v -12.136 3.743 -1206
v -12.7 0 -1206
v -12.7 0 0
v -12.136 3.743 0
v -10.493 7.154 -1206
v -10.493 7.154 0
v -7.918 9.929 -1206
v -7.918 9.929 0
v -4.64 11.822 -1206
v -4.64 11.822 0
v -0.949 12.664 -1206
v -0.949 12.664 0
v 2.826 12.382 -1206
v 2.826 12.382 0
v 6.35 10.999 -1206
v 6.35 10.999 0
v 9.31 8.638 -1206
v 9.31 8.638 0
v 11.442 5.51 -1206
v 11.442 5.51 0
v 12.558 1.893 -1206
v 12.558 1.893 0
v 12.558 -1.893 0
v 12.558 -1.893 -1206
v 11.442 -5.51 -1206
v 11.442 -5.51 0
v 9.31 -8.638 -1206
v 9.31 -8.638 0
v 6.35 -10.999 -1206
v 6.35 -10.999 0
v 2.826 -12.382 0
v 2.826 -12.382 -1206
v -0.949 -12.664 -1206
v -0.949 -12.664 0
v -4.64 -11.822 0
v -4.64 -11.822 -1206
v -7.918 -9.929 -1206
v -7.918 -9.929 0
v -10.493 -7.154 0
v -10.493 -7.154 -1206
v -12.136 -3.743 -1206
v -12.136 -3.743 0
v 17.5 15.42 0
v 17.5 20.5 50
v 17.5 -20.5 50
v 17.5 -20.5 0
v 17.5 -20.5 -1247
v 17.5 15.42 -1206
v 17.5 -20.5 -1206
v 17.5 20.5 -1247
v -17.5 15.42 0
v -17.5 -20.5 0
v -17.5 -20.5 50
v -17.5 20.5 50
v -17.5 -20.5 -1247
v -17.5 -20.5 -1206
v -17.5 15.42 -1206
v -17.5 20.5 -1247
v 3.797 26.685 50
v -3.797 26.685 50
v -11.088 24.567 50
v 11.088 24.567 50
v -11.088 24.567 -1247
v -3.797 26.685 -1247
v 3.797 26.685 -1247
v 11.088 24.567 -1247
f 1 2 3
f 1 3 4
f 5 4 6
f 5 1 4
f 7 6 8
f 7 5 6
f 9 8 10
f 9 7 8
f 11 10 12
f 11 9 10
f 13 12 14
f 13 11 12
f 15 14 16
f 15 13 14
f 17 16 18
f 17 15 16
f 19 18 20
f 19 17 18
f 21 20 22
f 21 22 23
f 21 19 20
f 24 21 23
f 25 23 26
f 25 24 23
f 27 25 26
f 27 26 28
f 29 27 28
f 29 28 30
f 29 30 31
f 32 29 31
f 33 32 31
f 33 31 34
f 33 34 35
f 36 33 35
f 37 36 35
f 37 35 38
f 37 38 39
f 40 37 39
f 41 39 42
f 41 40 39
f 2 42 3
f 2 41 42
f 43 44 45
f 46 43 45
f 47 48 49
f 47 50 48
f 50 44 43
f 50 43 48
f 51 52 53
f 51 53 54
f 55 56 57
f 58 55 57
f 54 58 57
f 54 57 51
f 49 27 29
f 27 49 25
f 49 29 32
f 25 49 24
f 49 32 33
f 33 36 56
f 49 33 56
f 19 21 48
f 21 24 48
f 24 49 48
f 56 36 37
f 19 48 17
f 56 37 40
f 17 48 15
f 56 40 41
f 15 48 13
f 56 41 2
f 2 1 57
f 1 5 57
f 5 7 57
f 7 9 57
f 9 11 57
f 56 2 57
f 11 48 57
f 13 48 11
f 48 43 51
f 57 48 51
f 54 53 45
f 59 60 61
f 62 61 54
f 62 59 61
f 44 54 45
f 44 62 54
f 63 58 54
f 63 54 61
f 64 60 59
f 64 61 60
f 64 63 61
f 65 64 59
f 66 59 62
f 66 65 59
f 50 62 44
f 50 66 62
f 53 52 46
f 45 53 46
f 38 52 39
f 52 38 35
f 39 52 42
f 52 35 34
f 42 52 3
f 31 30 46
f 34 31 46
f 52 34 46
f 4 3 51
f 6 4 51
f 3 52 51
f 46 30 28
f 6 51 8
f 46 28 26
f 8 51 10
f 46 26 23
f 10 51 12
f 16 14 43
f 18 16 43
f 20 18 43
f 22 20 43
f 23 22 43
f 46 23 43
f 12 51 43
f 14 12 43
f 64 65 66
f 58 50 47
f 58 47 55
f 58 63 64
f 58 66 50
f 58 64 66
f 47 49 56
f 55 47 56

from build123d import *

# Parameters (mm, degrees)
BOSS_EXTRUDE1_DEPTH = 50
BOSS_EXTRUDE2_START = 1206
SKETCH3_R           = 12.7
BOSS_EXTRUDE2_DEPTH = 1206
BOSS_EXTRUDE3_START = 41
BOSS_EXTRUDE3_DEPTH = 41


with BuildPart() as part:
    # Sketch2 → Boss-Extrude1 (new body)
    with BuildSketch(Plane.XY):
        with BuildLine():
            Line((-17.5, -20.5), (17.5, -20.5))
            Line((17.5, -20.5), (17.5, 20.5))
            ThreePointArc((17.5, 20.5), (0, 26.953663944), (-17.5, 20.5))
            Line((-17.5, 20.5), (-17.5, -20.5))
        make_face()
    extrude(amount=BOSS_EXTRUDE1_DEPTH)

    # Sketch3 → Boss-Extrude2 (add)
    with BuildSketch(Plane(origin=(0, 0, 0), x_dir=(-1, 0, 0), z_dir=(0, 0, -1)).offset(BOSS_EXTRUDE2_START)):
        Circle(SKETCH3_R)
        with BuildLine():
            ThreePointArc((17.5, 20.5), (0, 26.953663944), (-17.5, 20.5))
            Line((-17.5, 20.5), (-17.5, 15.42))
            Line((-17.5, 15.42), (17.5, 15.42))
            Line((17.5, 15.42), (17.5, 20.5))
        make_face()
    extrude(amount=-BOSS_EXTRUDE2_DEPTH)

    # Sketch4 → Boss-Extrude3 (add)
    with BuildSketch(Plane(origin=(0, 0, -1206), x_dir=(-1, 0, 0), z_dir=(0, 0, -1)).offset(BOSS_EXTRUDE3_START)):
        with BuildLine():
            Line((-17.5, 20.5), (-17.5, -20.5))
            Line((-17.5, -20.5), (17.5, -20.5))
            Line((17.5, -20.5), (17.5, 20.5))
            ThreePointArc((17.5, 20.5), (0, 26.953663944), (-17.5, 20.5))
        make_face()
    extrude(amount=-BOSS_EXTRUDE3_DEPTH)


solid = part.part
